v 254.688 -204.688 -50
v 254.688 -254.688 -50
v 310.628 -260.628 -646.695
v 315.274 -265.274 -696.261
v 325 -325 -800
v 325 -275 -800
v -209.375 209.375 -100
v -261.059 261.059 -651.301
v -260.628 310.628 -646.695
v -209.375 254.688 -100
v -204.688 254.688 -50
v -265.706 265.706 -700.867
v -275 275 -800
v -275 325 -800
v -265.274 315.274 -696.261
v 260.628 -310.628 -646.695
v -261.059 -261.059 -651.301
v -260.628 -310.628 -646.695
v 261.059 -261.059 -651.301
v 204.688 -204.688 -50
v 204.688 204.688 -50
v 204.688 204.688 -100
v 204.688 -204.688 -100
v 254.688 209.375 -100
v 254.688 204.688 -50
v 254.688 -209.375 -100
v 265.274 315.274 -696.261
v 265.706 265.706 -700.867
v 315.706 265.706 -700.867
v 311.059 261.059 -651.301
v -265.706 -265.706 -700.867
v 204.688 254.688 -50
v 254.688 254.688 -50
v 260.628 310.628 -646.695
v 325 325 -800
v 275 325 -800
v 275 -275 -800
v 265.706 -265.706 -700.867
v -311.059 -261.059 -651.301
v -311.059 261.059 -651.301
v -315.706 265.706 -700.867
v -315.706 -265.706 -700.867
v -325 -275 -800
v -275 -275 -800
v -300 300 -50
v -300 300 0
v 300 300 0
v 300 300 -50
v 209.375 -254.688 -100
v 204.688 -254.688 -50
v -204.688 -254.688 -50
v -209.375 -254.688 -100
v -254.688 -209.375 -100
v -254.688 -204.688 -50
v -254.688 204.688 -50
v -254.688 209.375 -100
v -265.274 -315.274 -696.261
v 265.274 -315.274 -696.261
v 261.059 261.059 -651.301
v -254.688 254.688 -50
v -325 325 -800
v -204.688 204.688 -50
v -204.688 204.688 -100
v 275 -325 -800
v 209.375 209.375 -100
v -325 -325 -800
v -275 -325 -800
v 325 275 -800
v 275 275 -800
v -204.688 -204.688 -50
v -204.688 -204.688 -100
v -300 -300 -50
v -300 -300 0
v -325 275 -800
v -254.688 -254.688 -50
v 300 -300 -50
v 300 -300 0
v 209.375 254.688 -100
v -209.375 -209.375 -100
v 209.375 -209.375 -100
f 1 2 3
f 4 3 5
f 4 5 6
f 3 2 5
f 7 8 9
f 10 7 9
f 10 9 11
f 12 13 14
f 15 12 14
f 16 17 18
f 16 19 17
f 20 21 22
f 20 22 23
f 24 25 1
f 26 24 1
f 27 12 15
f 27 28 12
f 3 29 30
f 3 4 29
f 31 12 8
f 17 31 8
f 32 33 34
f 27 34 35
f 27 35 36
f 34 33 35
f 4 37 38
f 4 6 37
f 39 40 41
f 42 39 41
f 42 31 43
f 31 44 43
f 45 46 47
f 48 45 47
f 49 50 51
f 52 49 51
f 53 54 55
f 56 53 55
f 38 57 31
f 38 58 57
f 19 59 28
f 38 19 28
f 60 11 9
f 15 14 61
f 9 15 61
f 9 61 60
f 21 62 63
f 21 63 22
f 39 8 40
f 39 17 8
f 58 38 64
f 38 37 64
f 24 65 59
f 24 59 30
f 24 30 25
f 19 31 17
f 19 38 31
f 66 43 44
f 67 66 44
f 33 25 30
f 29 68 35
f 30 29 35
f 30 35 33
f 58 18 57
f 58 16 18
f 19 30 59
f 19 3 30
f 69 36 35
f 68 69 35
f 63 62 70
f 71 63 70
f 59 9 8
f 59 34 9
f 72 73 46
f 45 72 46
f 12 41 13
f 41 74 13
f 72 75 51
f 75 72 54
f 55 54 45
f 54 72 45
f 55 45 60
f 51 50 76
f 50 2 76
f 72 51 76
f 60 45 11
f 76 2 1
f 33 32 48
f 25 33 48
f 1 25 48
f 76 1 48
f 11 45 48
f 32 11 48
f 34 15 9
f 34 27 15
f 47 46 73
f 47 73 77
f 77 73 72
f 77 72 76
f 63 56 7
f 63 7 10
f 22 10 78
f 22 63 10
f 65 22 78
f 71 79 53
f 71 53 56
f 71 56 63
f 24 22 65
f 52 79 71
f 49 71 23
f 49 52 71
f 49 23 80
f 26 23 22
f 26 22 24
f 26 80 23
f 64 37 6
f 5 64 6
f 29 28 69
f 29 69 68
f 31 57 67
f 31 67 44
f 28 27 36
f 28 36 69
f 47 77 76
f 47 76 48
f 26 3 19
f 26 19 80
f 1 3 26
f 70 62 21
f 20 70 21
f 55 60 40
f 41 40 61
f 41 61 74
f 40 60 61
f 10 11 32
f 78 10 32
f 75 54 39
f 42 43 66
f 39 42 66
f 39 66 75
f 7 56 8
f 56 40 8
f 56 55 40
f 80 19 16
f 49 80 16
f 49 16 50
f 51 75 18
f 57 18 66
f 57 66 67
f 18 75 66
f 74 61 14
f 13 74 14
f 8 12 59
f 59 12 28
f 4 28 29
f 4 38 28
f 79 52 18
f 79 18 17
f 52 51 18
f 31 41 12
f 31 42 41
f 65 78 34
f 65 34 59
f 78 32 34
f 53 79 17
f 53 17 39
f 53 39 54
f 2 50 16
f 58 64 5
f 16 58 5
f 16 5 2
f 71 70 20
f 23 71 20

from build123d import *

# Parameters (mm, degrees)
F0_W      = 50
F0_H      = 50
F2_W      = 50
F2_H      = 50
F3_W      = 600
F3_H      = 600
F8_DEPTH  = 50
F9_W      = 409.375
F9_H      = 409.375
F10_DEPTH = 50


with BuildPart() as f4:
    # F0 (on Top) → F4 section 0
    with BuildSketch(Plane.XY):
        with Locations((-225, -225)):
            Rectangle(F0_W, F0_H)
    # F2 (on offset) → F4 section 1
    with BuildSketch(Plane.XY.offset(-800)):
        with Locations((-300, -300)):
            Rectangle(F2_W, F2_H)
    loft()



with BuildPart() as f5:
    # F0 (on Top) → F5 section 0
    with BuildSketch(Plane.XY):
        with Locations((225, -225)):
            Rectangle(F0_W, F0_H)
    # F2 (on offset) → F5 section 1
    with BuildSketch(Plane.XY.offset(-800)):
        with Locations((300, -300)):
            Rectangle(F2_W, F2_H)
    loft()


with BuildPart() as f6:
    # F0 (on Top) → F6 section 0
    with BuildSketch(Plane.XY):
        with Locations((-225, 225)):
            Rectangle(F0_W, F0_H)
    # F2 (on offset) → F6 section 1
    with BuildSketch(Plane.XY.offset(-800)):
        with Locations((-300, 300)):
            Rectangle(F2_W, F2_H)
    loft()


with BuildPart() as f7:
    # F0 (on Top) → F7 section 0
    with BuildSketch(Plane.XY):
        with Locations((225, 225)):
            Rectangle(F0_W, F0_H)
    # F2 (on offset) → F7 section 1
    with BuildSketch(Plane.XY.offset(-800)):
        with Locations((300, 300)):
            Rectangle(F2_W, F2_H)
    loft()


with BuildPart() as f4_1:
    add(f4.part)

    add(f5.part)  # F8 merges F5

    add(f6.part)  # F8 merges F6

    add(f7.part)  # F8 merges F7
    # F3 (on Top) → F8 (join)
    with BuildSketch(Plane.XY):
        Rectangle(F3_W, F3_H)
    extrude(amount=-F8_DEPTH)

    # F9 (on face) → F10 (join)
    with BuildSketch(Plane(origin=(0, 0, -50), x_dir=(1, 0, 0), z_dir=(0, 0, -1))):
        Polygon((254.6875, -254.6875), (254.6875, -204.6875), (254.6875, 204.6875), (254.6875, 254.6875), (204.6875, 254.6875), (-204.6875, 254.6875), (-254.6875, 254.6875), (-254.6875, -254.6875), (-204.6875, -254.6875), (204.6875, -254.6875), align=None)
        Rectangle(F9_W, F9_H, mode=Mode.SUBTRACT)
    extrude(amount=F10_DEPTH)

    # F13 (on face) → F15 section 0
    with BuildSketch(Plane(origin=(-198.2575024201, 0, 18.5866408519), x_dir=(0, 1, 0), z_dir=(0.9956342261, 0, -0.0933407087))):
        Polygon((261.0594902568, -672.8252733026), (265.7063268379, -722.6088741144), (315.2744650336, -717.9821489666), (310.6276284526, -668.1985481548), align=None)
    # F14 (on face) → F15 section 1
    with BuildSketch(Plane(origin=(198.2575024201, 0, 18.5866408519), x_dir=(0, -1, 0), z_dir=(-0.9956342261, 0, -0.0933407087))):
        Polygon((-315.2744650336, -717.9821489666), (-265.7063268379, -722.6088741144), (-261.0594902568, -672.8252733026), (-310.6276284526, -668.1985481548), align=None)
    loft()

    # F12 (on face) → F18 section 0
    with BuildSketch(Plane(origin=(0, 198.2575024201, 18.5866408519), x_dir=(1, 0, 0), z_dir=(0, -0.9956342261, -0.0933407087))):
        Polygon((-315.7063268379, -722.6088741144), (-265.7063268379, -722.6088741144), (-261.0594902568, -672.8252733026), (-311.0594902568, -672.8252733026), align=None)
    # F16 (on face) → F18 section 1
    with BuildSketch(Plane(origin=(0, -198.2575024201, 18.5866408519), x_dir=(-1, 0, 0), z_dir=(0, 0.9956342261, -0.0933407087))):
        Polygon((261.0594902568, -672.8252733026), (265.7063268379, -722.6088741144), (315.7063268379, -722.6088741144), (311.0594902568, -672.8252733026), align=None)
    loft()

    # F17 (on face) → F21 section 0
    with BuildSketch(Plane(origin=(-198.2575024201, 0, 18.5866408519), x_dir=(0, 1, 0), z_dir=(0.9956342261, 0, -0.0933407087))):
        Polygon((-315.2744650336, -717.9821489666), (-265.7063268379, -722.6088741144), (-261.0594902568, -672.8252733026), (-310.6276284526, -668.1985481548), align=None)
    # F19 (on face) → F21 section 1
    with BuildSketch(Plane(origin=(198.2575024201, 0, 18.5866408519), x_dir=(0, -1, 0), z_dir=(-0.9956342261, 0, -0.0933407087))):
        Polygon((261.0594902568, -672.8252733026), (265.7063268379, -722.6088741144), (315.2744650336, -717.9821489666), (310.6276284526, -668.1985481548), align=None)
    loft()

    # F22 (on face) → F23 section 0
    with BuildSketch(Plane(origin=(0, 198.2575024201, 18.5866408519), x_dir=(1, 0, 0), z_dir=(0, -0.9956342261, -0.0933407087))):
        Polygon((261.0594902568, -672.8252733026), (265.7063268379, -722.6088741144), (315.7063268379, -722.6088741144), (311.0594902568, -672.8252733026), align=None)
    # F20 (on face) → F23 section 1
    with BuildSketch(Plane(origin=(0, -198.2575024201, 18.5866408519), x_dir=(-1, 0, 0), z_dir=(0, 0.9956342261, -0.0933407087))):
        Polygon((-315.2744650336, -717.9821489666), (-265.7063268379, -722.6088741144), (-261.0594902568, -672.8252733026), (-310.6276284526, -668.1985481548), align=None)
    loft()


solid = f4_1.part
